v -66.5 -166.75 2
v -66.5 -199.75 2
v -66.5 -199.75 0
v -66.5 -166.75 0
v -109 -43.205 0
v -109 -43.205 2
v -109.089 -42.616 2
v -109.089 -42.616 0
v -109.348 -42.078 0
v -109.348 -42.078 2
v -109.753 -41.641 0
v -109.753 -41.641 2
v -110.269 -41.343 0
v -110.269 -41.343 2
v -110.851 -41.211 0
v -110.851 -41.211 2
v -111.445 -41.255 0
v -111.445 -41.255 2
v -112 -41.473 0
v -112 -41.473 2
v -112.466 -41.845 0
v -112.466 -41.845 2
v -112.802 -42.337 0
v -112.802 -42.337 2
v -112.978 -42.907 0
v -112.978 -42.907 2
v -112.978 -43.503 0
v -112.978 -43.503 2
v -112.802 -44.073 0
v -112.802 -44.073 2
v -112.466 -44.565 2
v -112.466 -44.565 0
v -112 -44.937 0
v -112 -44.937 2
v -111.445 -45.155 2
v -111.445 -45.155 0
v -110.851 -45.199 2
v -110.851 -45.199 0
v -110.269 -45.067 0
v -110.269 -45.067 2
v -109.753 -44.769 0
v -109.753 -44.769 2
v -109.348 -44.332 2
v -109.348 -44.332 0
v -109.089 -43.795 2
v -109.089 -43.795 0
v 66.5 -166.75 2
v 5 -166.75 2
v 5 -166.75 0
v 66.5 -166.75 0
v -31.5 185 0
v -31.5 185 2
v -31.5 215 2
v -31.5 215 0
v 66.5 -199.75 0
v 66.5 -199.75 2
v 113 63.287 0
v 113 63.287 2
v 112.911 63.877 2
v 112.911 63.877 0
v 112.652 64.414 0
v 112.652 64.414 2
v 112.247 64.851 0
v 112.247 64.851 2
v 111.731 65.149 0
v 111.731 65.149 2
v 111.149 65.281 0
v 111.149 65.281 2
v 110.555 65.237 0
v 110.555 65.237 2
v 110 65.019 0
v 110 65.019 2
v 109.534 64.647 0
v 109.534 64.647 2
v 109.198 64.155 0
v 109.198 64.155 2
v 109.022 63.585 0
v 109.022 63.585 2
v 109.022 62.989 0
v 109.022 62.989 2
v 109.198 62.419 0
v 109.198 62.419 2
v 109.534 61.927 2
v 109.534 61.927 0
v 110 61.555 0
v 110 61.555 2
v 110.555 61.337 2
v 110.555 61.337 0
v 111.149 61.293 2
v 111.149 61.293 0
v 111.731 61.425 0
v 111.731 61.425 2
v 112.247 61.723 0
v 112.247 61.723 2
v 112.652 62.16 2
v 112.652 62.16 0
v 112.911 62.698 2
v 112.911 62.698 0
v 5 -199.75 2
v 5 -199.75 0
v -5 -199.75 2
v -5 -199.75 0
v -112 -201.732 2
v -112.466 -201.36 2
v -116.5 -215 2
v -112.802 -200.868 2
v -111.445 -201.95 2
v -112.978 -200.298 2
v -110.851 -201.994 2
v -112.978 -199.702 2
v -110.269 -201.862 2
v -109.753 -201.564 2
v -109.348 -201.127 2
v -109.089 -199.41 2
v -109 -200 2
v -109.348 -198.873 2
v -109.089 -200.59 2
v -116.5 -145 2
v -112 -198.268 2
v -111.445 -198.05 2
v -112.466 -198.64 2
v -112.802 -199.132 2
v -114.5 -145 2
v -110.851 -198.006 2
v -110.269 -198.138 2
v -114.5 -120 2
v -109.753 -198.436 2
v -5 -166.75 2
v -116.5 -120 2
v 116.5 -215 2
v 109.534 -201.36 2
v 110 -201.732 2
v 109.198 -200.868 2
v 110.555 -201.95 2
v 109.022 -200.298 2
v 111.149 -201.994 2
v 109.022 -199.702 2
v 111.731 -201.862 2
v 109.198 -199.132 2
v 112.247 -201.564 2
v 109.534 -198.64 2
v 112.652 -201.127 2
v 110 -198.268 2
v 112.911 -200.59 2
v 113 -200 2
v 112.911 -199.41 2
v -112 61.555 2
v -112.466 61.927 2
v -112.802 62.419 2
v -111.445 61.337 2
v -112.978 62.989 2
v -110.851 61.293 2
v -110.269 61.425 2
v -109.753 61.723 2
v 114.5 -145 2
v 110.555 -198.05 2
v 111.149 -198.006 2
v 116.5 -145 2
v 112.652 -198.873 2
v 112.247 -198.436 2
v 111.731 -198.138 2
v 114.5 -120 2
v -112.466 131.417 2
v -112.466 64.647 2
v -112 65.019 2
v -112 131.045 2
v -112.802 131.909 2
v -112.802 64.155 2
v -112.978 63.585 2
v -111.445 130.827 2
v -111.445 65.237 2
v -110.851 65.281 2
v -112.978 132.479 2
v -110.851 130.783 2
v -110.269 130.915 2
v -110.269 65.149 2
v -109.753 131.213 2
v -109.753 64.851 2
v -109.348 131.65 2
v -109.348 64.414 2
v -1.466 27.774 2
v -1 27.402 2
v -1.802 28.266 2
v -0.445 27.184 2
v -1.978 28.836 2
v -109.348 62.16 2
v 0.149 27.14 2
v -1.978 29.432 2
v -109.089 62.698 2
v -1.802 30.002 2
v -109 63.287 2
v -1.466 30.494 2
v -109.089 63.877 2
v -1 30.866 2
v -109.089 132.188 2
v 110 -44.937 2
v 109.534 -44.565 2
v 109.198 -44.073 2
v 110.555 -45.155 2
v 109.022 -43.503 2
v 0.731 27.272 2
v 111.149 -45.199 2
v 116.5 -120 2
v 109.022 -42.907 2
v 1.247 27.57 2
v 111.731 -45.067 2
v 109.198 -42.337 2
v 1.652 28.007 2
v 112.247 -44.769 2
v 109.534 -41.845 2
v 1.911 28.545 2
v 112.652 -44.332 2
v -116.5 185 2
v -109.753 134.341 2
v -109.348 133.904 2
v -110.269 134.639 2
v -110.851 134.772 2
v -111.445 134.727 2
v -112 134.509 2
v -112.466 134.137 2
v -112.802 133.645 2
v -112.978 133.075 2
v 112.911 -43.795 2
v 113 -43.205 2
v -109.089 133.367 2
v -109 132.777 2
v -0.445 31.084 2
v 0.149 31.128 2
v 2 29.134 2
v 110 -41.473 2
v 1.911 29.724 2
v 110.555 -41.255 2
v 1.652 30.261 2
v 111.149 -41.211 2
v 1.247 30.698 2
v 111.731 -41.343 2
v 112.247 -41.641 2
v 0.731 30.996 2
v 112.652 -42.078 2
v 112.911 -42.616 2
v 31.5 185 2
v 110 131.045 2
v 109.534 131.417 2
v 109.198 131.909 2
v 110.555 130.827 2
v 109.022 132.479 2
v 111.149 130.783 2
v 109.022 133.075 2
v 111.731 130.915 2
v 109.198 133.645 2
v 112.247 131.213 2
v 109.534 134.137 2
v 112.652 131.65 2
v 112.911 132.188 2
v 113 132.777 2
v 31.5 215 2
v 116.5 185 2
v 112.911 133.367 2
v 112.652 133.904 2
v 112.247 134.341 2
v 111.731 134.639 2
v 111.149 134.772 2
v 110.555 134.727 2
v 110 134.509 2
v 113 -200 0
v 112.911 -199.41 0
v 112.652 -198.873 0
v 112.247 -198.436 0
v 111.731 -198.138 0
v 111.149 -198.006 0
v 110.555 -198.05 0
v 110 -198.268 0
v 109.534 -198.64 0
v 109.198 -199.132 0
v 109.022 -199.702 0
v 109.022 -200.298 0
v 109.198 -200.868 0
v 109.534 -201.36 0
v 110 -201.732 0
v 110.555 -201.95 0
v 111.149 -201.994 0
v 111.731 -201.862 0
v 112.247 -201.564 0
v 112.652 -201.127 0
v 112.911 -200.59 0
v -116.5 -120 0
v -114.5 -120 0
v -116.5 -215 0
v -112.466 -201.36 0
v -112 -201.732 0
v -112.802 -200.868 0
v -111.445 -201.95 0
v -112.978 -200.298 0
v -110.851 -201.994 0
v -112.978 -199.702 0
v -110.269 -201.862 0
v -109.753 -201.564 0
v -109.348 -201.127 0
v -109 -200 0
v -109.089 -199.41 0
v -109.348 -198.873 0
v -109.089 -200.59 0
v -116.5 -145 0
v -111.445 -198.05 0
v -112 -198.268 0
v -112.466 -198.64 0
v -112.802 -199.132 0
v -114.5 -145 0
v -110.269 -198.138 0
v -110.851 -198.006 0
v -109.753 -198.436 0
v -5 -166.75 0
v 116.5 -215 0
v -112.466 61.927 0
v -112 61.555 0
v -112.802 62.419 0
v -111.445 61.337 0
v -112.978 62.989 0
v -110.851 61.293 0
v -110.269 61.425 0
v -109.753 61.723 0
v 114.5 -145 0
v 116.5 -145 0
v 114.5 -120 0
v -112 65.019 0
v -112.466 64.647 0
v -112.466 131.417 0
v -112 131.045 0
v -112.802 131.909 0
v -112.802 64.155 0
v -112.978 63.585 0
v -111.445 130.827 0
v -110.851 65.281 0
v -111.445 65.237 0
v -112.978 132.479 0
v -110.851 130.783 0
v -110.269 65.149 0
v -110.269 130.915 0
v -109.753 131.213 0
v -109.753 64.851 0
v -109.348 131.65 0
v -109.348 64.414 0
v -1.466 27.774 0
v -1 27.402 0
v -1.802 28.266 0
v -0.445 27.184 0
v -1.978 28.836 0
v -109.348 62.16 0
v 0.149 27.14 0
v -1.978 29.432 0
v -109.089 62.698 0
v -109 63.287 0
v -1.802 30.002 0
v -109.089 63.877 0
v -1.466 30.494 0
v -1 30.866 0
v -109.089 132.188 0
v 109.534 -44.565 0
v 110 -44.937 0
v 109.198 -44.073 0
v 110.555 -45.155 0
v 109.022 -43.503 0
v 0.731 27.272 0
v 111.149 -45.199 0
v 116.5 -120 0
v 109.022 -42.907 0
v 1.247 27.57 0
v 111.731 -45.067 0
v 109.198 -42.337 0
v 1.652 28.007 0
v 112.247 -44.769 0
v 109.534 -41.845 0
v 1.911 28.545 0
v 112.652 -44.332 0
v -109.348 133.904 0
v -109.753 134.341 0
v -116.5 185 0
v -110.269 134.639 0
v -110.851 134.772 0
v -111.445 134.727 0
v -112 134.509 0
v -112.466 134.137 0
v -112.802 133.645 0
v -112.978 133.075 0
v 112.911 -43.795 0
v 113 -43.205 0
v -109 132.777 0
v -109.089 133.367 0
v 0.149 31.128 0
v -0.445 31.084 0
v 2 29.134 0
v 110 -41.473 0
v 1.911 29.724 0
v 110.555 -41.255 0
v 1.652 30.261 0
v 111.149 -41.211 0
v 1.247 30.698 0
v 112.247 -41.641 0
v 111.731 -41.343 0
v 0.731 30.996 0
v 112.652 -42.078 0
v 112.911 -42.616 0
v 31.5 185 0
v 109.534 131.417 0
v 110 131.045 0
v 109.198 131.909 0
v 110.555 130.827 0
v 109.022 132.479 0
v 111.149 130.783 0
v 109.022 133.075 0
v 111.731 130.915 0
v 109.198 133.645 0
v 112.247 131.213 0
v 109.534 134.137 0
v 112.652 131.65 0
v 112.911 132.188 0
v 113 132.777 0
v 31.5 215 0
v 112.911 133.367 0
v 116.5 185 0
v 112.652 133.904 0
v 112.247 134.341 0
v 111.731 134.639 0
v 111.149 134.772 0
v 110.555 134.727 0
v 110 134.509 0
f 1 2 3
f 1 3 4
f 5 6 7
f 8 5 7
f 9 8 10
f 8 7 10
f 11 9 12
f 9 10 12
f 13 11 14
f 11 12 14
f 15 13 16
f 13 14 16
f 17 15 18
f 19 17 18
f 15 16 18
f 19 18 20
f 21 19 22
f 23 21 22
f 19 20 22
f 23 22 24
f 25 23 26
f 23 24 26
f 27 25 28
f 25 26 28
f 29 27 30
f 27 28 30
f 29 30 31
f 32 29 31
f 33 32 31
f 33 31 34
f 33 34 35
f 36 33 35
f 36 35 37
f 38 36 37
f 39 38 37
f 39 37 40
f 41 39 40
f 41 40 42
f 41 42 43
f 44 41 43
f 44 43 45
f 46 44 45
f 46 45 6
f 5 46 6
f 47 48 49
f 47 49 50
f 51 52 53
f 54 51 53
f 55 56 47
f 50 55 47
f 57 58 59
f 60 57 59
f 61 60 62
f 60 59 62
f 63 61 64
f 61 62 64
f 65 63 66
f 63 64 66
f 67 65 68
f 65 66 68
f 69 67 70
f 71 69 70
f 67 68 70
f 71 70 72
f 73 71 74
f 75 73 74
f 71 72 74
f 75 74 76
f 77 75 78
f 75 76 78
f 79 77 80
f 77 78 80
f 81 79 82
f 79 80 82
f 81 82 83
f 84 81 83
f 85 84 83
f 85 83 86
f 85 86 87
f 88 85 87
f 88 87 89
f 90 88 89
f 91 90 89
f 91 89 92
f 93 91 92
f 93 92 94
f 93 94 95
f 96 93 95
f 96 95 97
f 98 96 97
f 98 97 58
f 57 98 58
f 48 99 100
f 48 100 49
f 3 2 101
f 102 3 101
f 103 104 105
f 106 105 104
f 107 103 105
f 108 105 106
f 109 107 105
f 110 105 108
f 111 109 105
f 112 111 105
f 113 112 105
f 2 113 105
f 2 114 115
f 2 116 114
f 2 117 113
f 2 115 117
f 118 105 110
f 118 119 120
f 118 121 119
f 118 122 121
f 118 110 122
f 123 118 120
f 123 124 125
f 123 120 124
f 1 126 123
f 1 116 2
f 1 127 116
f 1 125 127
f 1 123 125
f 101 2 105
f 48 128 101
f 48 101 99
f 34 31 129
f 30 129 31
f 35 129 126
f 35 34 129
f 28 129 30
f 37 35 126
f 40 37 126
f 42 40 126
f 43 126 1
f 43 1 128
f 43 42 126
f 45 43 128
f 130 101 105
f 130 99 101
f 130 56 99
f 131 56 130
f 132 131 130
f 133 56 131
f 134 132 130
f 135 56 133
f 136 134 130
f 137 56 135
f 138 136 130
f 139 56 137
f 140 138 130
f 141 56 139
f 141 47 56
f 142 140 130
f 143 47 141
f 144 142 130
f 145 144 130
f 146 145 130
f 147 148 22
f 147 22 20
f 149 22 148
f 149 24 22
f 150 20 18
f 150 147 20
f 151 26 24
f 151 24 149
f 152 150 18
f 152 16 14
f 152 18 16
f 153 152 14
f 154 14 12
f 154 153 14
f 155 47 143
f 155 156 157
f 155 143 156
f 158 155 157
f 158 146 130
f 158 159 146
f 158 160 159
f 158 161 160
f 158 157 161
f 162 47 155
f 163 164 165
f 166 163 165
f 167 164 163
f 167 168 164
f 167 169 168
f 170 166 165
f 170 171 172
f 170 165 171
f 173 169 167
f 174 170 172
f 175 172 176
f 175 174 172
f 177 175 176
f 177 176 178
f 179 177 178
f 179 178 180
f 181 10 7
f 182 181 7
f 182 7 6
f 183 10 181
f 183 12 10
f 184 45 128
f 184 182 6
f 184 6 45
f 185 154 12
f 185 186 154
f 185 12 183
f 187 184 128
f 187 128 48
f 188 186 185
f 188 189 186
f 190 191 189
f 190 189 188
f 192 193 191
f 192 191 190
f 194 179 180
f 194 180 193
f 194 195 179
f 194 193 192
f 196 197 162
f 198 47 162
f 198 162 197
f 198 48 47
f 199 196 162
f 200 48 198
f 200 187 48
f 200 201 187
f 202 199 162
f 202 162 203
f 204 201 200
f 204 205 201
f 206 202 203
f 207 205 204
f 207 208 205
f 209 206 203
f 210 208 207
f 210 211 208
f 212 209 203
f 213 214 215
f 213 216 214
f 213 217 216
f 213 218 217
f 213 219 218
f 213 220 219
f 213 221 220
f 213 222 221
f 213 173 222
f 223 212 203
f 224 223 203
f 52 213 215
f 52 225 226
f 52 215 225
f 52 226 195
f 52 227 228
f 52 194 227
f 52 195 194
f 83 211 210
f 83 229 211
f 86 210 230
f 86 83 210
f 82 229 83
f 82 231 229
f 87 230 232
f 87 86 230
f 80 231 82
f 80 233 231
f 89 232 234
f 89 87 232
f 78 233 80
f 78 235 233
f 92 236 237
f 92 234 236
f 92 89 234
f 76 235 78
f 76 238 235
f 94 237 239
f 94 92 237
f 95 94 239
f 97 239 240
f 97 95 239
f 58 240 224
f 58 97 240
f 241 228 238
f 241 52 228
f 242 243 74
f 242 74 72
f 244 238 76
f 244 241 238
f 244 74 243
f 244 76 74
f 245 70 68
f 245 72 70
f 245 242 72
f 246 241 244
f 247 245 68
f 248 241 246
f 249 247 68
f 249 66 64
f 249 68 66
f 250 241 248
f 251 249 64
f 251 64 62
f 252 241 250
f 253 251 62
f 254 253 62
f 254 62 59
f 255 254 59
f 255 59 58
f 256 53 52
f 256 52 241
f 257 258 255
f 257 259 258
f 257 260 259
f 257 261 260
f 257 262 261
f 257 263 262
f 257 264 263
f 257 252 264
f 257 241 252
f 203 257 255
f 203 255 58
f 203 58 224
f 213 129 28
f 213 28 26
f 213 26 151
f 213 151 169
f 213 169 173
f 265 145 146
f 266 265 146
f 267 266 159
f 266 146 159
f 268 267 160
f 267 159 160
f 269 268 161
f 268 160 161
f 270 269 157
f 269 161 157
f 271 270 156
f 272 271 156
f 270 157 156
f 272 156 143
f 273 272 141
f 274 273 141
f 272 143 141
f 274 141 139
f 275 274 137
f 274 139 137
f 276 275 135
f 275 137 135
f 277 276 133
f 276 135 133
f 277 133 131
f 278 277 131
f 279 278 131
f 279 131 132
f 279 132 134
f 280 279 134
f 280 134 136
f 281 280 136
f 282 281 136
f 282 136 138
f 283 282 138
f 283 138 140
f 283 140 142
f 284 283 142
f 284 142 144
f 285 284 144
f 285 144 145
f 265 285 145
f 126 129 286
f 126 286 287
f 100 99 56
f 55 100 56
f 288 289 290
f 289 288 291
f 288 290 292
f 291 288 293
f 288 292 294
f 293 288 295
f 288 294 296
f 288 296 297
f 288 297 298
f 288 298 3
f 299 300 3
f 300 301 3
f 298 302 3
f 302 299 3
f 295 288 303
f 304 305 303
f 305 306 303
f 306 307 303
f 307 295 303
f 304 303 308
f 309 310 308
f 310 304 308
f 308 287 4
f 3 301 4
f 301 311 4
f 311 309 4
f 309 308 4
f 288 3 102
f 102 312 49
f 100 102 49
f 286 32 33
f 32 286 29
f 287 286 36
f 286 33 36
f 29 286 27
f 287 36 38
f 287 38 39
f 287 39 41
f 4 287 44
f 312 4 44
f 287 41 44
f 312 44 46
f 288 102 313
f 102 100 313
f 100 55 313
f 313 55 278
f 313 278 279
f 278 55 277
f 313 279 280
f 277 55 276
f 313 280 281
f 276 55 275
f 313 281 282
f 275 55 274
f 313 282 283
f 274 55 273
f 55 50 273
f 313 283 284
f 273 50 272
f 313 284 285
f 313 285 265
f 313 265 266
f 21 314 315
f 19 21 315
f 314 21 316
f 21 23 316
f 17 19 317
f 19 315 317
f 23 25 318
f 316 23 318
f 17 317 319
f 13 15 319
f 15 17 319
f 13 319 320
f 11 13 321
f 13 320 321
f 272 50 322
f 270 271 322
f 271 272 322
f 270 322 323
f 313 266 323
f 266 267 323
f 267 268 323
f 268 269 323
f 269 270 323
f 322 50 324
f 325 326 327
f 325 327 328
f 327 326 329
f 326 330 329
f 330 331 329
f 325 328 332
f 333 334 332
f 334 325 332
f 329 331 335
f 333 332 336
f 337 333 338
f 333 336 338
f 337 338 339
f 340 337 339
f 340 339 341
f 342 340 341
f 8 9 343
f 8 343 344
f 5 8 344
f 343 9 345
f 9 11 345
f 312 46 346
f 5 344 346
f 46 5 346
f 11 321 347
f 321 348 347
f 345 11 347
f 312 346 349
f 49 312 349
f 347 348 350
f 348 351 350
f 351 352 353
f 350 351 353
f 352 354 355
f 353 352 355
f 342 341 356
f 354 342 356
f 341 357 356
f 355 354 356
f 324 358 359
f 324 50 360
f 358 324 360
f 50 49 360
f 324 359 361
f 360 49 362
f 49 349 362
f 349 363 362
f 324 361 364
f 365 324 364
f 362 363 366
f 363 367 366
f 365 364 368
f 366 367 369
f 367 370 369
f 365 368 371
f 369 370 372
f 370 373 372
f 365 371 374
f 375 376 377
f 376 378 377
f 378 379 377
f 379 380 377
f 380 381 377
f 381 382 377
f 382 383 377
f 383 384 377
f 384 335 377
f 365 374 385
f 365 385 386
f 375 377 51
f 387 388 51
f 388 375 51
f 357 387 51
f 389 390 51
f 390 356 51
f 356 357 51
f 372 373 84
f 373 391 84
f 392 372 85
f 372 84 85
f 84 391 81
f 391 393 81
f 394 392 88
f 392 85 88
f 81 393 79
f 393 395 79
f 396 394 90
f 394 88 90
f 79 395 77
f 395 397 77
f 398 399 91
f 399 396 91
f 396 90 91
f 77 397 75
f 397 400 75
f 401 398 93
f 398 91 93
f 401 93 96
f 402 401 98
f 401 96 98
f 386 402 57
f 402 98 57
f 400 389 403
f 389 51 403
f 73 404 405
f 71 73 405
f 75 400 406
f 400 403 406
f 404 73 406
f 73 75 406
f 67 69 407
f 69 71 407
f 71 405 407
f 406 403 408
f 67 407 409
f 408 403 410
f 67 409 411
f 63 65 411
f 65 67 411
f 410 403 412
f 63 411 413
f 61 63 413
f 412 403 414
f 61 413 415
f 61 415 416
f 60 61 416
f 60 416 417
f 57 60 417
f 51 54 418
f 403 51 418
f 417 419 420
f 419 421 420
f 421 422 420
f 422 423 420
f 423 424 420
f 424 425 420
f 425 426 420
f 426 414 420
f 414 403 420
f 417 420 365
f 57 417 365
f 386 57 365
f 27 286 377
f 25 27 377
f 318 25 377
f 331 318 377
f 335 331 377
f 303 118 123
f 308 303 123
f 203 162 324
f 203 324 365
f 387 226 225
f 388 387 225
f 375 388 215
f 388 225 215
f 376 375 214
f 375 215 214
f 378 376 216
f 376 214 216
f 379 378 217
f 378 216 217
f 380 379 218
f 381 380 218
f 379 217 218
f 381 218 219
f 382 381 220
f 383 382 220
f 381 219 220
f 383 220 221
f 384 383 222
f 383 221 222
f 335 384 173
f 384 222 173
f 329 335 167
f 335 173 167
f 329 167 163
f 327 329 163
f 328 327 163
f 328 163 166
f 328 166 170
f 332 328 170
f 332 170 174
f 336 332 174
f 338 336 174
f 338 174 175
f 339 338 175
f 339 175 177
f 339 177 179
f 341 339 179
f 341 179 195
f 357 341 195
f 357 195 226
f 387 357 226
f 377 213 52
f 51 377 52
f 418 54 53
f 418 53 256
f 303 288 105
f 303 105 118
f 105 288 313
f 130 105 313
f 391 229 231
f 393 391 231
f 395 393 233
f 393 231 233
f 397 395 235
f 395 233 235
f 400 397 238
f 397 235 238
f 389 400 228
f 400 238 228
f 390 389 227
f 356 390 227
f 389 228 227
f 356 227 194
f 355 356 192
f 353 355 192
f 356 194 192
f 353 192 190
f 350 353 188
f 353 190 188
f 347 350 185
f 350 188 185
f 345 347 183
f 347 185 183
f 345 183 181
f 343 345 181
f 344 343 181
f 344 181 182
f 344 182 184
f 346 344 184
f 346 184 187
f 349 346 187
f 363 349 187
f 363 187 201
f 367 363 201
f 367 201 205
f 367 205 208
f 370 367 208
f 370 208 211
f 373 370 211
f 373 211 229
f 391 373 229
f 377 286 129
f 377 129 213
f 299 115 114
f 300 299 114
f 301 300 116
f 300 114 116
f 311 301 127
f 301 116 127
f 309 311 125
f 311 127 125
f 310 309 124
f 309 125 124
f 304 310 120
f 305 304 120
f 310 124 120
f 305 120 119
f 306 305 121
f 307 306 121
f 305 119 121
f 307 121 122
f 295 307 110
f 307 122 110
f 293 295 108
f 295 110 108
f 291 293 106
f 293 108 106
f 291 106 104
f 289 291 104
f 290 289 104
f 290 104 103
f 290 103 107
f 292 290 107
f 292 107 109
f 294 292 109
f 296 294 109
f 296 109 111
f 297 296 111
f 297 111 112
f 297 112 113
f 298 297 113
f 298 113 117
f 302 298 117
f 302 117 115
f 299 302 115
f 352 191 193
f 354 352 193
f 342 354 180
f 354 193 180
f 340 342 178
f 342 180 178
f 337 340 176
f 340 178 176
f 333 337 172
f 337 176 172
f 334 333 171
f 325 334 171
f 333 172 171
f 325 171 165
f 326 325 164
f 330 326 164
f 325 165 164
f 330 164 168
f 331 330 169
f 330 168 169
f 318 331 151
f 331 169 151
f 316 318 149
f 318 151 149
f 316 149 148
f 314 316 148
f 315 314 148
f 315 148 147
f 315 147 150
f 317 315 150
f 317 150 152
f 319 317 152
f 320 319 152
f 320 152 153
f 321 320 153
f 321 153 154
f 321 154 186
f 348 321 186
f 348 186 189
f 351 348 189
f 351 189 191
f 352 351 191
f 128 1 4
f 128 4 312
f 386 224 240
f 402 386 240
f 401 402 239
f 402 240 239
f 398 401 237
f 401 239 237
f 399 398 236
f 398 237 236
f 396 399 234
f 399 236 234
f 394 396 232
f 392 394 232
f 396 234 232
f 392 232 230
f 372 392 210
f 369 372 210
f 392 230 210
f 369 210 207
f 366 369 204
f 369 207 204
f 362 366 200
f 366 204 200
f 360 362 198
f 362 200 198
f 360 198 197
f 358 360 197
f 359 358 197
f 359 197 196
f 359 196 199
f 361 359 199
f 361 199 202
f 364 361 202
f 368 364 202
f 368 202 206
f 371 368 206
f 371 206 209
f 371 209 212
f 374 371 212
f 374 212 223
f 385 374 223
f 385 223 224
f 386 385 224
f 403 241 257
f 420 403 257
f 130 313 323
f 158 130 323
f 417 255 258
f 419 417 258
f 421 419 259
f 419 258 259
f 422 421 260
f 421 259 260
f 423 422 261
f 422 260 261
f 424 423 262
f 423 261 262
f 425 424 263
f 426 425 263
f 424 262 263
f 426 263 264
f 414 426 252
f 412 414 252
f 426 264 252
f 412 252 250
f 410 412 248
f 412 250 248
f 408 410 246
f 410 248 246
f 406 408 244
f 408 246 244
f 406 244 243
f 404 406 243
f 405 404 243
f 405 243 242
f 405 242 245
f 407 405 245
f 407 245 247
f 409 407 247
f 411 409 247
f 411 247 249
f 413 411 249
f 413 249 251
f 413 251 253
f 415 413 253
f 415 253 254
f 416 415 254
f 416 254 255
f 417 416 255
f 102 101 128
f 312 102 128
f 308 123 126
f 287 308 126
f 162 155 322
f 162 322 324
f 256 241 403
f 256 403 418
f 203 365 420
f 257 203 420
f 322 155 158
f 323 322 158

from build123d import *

# Parameters (mm, degrees)
F0_W     = 233
F0_H     = 430
F1_DEPTH = 2
F2_W     = 85
F2_H     = 30
F2_W_2   = 61.5
F2_H_2   = 33
F2_W_3   = 2
F2_H_3   = 25
F2_R     = 2
F3_DEPTH = 2.001


with BuildPart() as f1:
    # F0 (on Top) → F1 (new body)
    with BuildSketch(Plane.XY):
        Rectangle(F0_W, F0_H)
    extrude(amount=F1_DEPTH)

    # F2 (on face) → F3 (cut, through all)
    with BuildSketch(Plane.XY.offset(2)):
        with Locations((-74, 200)):
            Rectangle(F2_W, F2_H)
        with Locations((74, 200)):
            Rectangle(F2_W, F2_H)
        with Locations((-35.75, -183.25)):
            Rectangle(F2_W_2, F2_H_2)
        with Locations((35.75, -183.25)):
            Rectangle(F2_W_2, F2_H_2)
        with Locations((-115.5, -132.5)):
            Rectangle(F2_W_3, F2_H_3)
        with Locations((115.5, -132.5)):
            Rectangle(F2_W_3, F2_H_3)
        with Locations((-111, 132.77711)):
            Circle(F2_R)
        with Locations((111, 132.77711)):
            Circle(F2_R)
        with Locations((-111, 63.28708)):
            Circle(F2_R)
        with Locations((111, 63.28708)):
            Circle(F2_R)
        with Locations((-111, -43.205046)):
            Circle(F2_R)
        with Locations((111, -43.205046)):
            Circle(F2_R)
        with Locations((111, -200)):
            Circle(F2_R)
        with Locations((-111, -200)):
            Circle(F2_R)
        with Locations((0, 29.134061)):
            Circle(F2_R)
    extrude(amount=-F3_DEPTH, mode=Mode.SUBTRACT)


solid = f1.part
